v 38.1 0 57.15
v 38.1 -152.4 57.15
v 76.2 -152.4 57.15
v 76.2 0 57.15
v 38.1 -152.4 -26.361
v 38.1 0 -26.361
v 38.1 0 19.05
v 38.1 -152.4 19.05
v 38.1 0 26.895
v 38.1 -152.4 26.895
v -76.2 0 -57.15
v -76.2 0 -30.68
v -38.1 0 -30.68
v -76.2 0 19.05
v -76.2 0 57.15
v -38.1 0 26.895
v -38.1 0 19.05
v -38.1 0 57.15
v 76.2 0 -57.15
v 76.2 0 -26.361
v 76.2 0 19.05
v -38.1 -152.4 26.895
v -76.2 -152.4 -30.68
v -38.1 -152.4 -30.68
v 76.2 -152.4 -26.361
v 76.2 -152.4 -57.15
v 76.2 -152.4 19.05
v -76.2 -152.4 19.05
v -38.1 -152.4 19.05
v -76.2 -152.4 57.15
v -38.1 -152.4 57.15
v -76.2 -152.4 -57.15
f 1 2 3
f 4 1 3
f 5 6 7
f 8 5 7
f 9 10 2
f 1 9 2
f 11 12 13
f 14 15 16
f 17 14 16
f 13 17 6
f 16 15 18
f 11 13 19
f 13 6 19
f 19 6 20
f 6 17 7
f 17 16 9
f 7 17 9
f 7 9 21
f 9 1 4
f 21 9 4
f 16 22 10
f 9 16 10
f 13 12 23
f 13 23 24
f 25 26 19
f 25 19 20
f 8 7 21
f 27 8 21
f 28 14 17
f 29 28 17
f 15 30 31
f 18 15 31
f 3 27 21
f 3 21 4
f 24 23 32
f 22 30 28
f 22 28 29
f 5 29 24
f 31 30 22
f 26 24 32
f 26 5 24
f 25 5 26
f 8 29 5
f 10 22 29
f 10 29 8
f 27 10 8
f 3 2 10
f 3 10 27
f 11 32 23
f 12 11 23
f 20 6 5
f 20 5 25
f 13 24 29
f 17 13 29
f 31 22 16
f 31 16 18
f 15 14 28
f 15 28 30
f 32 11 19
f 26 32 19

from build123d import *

# Parameters (mm, degrees)
F0_W     = 152.4
F0_H     = 114.3
F1_DEPTH = 152.4
F2_W     = 76.2
F2_H     = 30.254747
F3_DEPTH = 152.401
F2_W_2   = 38.1
F2_H_2   = 49.729511
F4_DEPTH = 152.401
F2_H_3   = 45.411082
F5_DEPTH = 152.401


with BuildPart() as f1:
    # F0 (on Front) → F1 (new body)
    with BuildSketch(Plane.XZ):
        Rectangle(F0_W, F0_H)
    extrude(amount=F1_DEPTH)

    # F2 (on face) → F3 (cut, through all)
    with BuildSketch(Plane.XZ.offset(152.4)):
        with Locations((0, 42.022627)):
            Rectangle(F2_W, F2_H)
    extrude(amount=-F3_DEPTH, mode=Mode.SUBTRACT)

    # F2 (on face) → F4 (cut, through all)
    with BuildSketch(Plane.XZ.offset(152.4)):
        with Locations((-57.15, -5.814755)):
            Rectangle(F2_W_2, F2_H_2)
    extrude(amount=-F4_DEPTH, mode=Mode.SUBTRACT)

    # F2 (on face) → F5 (cut, through all)
    with BuildSketch(Plane.XZ.offset(152.4)):
        with Locations((57.15, -3.655541)):
            Rectangle(F2_W_2, F2_H_3)
    extrude(amount=-F5_DEPTH, mode=Mode.SUBTRACT)


solid = f1.part
